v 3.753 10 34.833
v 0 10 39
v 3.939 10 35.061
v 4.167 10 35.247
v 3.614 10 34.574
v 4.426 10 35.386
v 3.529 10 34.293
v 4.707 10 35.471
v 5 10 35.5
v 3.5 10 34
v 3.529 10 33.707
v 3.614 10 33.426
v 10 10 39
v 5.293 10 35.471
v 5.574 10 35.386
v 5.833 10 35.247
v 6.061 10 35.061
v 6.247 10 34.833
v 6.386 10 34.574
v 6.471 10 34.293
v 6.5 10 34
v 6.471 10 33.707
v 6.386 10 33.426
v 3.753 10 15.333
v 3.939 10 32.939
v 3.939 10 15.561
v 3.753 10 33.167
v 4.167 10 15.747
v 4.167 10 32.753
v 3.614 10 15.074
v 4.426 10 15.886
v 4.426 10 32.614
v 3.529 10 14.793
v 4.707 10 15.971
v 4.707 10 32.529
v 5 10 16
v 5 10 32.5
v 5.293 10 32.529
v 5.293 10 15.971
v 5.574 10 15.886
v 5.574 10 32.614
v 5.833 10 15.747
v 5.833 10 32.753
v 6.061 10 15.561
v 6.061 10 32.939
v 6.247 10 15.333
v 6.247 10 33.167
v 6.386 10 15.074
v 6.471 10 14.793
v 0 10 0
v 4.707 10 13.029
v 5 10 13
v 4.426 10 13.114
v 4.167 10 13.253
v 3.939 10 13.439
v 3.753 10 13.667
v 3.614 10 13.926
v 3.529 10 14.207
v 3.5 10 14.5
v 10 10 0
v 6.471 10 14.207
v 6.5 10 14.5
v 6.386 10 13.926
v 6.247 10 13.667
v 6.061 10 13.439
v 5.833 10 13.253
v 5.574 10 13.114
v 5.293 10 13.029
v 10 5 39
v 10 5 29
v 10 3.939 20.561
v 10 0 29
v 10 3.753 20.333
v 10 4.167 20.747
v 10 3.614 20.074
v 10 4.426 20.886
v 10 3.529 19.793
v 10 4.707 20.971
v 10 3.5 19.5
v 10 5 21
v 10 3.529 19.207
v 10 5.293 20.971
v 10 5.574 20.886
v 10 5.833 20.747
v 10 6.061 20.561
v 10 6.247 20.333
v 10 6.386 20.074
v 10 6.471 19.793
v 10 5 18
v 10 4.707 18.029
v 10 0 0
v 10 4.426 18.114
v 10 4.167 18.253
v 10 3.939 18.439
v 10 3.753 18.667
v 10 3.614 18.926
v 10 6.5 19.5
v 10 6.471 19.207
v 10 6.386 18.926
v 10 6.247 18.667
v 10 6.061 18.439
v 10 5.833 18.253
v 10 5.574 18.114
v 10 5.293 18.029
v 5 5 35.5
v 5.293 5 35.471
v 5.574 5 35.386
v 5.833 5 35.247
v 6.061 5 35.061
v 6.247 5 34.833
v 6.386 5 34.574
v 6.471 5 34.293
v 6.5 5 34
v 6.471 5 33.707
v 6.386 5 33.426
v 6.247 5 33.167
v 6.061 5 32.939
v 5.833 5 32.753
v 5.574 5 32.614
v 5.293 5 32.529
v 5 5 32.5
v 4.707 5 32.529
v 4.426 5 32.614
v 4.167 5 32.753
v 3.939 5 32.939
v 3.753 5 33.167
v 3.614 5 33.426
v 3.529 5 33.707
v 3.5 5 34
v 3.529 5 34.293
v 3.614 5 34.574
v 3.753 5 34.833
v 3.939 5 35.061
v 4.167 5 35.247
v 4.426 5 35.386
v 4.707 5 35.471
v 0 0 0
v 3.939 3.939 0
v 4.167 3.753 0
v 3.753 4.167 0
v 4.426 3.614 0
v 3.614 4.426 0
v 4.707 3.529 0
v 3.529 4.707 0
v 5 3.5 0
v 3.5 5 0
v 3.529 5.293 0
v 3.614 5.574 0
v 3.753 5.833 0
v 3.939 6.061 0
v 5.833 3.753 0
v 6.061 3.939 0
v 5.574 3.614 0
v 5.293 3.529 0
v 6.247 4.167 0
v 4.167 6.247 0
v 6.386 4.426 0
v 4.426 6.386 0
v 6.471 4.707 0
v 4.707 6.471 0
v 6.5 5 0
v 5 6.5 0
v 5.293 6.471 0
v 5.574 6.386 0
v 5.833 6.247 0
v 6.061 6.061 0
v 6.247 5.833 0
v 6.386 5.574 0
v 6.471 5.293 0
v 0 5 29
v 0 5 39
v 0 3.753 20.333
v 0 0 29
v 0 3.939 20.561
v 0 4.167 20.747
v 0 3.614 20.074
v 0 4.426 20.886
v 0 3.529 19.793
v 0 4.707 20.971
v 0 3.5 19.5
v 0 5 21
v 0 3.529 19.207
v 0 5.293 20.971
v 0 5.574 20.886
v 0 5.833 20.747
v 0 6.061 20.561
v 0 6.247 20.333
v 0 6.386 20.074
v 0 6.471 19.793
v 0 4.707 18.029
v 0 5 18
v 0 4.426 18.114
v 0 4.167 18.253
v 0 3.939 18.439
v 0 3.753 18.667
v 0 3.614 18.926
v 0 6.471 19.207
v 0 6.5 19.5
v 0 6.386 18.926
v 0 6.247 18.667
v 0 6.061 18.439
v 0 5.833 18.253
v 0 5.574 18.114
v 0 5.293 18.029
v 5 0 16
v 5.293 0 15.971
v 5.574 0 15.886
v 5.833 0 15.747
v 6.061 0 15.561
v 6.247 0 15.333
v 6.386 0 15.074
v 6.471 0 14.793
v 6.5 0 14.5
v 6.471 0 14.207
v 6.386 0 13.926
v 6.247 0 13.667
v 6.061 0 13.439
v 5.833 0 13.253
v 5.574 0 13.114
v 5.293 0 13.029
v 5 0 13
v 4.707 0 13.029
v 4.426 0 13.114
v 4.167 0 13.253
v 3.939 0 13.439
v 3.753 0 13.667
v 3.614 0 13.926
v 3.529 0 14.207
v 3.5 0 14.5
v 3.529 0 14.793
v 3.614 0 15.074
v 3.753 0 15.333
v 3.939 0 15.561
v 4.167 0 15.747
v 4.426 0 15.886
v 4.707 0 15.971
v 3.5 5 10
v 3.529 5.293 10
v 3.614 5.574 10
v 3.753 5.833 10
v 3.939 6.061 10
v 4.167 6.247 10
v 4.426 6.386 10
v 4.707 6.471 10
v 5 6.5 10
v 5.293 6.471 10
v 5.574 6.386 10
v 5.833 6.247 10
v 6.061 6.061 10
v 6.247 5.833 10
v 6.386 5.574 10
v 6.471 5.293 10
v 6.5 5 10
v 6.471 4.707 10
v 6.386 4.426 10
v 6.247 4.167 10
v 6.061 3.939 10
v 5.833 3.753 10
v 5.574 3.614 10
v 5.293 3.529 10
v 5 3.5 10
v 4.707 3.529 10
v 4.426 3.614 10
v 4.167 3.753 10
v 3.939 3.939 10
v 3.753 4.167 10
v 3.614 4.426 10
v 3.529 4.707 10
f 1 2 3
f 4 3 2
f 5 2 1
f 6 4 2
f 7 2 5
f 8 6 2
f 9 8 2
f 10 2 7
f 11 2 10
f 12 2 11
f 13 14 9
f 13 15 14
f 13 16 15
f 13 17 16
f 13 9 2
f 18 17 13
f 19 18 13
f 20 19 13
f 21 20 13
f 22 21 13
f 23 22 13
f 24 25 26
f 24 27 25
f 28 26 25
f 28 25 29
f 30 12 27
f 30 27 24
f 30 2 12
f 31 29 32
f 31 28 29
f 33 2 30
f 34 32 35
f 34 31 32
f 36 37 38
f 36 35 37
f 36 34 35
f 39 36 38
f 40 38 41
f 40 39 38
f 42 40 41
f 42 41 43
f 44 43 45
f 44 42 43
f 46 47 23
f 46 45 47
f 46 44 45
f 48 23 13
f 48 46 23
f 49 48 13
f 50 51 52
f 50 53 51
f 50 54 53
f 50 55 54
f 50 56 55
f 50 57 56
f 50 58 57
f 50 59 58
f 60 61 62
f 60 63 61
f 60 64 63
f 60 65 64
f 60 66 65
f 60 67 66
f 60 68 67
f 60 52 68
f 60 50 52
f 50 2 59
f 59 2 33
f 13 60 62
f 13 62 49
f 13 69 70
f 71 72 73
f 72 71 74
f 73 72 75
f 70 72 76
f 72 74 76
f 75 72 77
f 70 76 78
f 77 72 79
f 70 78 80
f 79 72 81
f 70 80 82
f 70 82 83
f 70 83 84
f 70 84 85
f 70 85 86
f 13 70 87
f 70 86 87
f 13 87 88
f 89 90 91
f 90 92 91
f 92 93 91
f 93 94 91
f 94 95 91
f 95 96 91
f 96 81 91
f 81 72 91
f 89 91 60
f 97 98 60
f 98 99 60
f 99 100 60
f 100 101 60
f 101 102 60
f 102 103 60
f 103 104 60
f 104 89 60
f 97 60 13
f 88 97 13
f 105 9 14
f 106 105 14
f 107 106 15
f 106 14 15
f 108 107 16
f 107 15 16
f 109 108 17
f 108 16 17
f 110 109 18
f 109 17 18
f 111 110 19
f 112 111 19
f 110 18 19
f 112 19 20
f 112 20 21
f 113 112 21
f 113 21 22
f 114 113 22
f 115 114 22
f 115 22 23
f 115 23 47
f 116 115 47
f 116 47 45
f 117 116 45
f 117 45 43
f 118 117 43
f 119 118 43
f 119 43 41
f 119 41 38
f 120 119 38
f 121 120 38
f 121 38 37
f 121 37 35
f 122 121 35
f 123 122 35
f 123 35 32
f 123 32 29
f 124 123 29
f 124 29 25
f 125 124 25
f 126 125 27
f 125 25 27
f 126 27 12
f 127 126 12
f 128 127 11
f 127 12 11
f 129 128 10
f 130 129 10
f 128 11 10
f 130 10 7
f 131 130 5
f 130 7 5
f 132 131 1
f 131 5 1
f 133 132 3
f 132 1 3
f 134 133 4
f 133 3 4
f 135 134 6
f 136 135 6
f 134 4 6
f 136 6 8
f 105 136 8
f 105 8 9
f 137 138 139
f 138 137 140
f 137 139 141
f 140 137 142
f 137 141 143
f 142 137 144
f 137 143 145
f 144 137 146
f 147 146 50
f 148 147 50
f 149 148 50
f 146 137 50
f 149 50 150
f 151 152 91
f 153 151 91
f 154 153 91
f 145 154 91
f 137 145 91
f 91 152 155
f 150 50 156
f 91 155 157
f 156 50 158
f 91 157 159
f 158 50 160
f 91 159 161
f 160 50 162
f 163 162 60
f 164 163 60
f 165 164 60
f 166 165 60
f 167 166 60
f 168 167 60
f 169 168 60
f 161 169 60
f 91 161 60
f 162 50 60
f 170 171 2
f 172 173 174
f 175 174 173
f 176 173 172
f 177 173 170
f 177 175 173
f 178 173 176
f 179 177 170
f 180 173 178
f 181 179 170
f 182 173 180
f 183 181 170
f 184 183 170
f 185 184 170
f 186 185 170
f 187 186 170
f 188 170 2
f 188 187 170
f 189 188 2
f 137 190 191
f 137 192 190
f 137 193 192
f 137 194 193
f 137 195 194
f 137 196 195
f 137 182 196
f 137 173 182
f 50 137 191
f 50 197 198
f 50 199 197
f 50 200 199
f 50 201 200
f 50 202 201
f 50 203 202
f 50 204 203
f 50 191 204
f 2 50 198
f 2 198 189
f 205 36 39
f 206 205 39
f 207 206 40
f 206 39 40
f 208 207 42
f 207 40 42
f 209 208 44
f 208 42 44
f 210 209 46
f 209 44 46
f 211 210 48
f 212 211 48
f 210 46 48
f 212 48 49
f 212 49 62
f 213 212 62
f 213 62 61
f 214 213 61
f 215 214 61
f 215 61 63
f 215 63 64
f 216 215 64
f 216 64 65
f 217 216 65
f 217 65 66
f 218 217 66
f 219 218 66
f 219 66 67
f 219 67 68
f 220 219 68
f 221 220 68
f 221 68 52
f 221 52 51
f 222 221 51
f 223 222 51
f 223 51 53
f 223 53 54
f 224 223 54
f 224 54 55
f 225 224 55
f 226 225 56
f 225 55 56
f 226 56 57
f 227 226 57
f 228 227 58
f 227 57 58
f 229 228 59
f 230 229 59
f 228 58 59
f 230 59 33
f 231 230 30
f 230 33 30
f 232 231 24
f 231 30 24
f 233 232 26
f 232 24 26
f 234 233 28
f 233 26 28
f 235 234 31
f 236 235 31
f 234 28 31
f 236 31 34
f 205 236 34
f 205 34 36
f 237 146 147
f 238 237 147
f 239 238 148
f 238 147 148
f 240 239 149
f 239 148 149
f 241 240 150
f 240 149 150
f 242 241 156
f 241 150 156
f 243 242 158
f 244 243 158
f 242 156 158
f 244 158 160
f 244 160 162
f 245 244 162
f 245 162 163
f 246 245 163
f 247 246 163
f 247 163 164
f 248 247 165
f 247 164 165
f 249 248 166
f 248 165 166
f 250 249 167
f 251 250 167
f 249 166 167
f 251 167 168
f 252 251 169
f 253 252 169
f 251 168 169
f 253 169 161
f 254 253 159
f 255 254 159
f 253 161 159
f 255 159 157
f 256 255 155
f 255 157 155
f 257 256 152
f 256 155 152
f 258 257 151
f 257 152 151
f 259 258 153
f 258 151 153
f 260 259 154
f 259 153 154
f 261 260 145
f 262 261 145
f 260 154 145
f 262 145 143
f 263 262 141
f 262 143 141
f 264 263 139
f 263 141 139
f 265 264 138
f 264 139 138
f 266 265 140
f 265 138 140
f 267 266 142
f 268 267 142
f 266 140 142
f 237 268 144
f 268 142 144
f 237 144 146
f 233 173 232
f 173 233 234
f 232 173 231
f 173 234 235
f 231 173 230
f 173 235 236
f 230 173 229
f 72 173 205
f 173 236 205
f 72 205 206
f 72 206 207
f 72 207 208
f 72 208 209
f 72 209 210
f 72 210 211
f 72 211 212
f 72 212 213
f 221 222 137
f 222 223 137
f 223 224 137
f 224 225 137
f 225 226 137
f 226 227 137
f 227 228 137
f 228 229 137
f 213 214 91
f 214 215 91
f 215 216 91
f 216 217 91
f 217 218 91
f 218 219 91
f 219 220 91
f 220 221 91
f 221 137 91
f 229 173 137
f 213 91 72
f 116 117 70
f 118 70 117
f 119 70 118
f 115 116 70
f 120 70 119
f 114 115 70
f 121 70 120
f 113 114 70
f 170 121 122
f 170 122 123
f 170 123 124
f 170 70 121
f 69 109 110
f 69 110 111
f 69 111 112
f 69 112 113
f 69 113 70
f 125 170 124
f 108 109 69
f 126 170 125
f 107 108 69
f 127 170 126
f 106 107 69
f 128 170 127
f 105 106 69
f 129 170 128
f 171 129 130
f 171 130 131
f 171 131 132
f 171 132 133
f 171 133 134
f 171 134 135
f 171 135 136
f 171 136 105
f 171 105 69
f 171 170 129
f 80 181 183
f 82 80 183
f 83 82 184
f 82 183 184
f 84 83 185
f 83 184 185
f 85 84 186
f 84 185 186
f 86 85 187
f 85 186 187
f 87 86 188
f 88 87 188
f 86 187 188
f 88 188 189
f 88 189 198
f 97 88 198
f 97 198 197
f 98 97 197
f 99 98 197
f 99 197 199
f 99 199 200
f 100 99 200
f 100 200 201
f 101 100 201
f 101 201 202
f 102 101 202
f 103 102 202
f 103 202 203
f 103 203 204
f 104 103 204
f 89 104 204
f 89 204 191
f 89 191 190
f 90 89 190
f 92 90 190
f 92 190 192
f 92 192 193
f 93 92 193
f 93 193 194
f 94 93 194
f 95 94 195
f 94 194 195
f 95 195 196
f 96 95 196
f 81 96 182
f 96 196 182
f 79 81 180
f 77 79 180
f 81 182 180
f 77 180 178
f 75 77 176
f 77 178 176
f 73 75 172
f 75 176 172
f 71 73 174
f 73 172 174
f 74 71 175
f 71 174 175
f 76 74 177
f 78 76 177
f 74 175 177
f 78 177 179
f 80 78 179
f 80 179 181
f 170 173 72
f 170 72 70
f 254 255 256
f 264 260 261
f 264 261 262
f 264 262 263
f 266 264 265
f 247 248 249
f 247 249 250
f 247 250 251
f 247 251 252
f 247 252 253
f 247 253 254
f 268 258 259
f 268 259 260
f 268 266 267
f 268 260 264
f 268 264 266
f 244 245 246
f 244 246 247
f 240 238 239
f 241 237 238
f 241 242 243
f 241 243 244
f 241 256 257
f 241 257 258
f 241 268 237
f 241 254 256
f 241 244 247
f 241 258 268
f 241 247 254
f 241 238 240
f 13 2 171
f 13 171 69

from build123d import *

# Parameters (mm, degrees)
ESQUISSE1_W             = 10
ESQUISSE1_H             = 10
BOSS_EXTRU_1_DEPTH      = 39
ESQUISSE2_W             = 10
ESQUISSE2_H             = 5
ENL_V_MAT_EXTRU_1_DEPTH = 10
ESQUISSE3_R             = 1.5
ENL_V_MAT_EXTRU_2_DEPTH = 10
ESQUISSE4_R             = 1.5
ENL_V_MAT_EXTRU_3_DEPTH = 42.484937025
ESQUISSE5_R             = 1.5
ENL_V_MAT_EXTRU_4_DEPTH = 42.484937025
ESQUISSE6_R             = 1.5
ENL_V_MAT_EXTRU_5_DEPTH = 42.484937025


with BuildPart() as part:
    # Esquisse1 → Boss.-Extru.1 (new body)
    with BuildSketch(Plane.XY):
        with Locations((5, 5)):
            Rectangle(ESQUISSE1_W, ESQUISSE1_H)
    extrude(amount=BOSS_EXTRU_1_DEPTH)

    # Esquisse2 → Enlèv. mat.-Extru.1 (cut)
    with BuildSketch(Plane.ZY):
        with Locations((34, 2.5)):
            Rectangle(ESQUISSE2_W, ESQUISSE2_H)
    extrude(amount=-ENL_V_MAT_EXTRU_1_DEPTH, mode=Mode.SUBTRACT)

    # Esquisse3 → Enlèv. mat.-Extru.2 (cut)
    with BuildSketch(Plane(origin=(0, 0, 0), x_dir=(-1, 0, 0), z_dir=(0, 0, -1))):
        with Locations((-5, 5)):
            Circle(ESQUISSE3_R)
    extrude(amount=-ENL_V_MAT_EXTRU_2_DEPTH, mode=Mode.SUBTRACT)

    # Esquisse4 → Enlèv. mat.-Extru.3 (cut, through all)
    with BuildSketch(Plane(origin=(0, 10, 0), x_dir=(1, 0, 0), z_dir=(0, 1, 0))):
        with Locations(Location((5, -34, 0), (0, 0, 270))):
            Circle(ESQUISSE4_R)
    extrude(amount=-ENL_V_MAT_EXTRU_3_DEPTH, mode=Mode.SUBTRACT)

    # Esquisse5 → Enlèv. mat.-Extru.4 (cut, through all)
    with BuildSketch(Plane.ZY):
        with Locations((19.5, 5)):
            Circle(ESQUISSE5_R)
    extrude(amount=-ENL_V_MAT_EXTRU_4_DEPTH, mode=Mode.SUBTRACT)

    # Esquisse6 → Enlèv. mat.-Extru.5 (cut, through all)
    with BuildSketch(Plane(origin=(0, 10, 0), x_dir=(1, 0, 0), z_dir=(0, 1, 0))):
        with Locations(Location((5, -14.5, 0), (0, 0, 270))):
            Circle(ESQUISSE6_R)
    extrude(amount=-ENL_V_MAT_EXTRU_5_DEPTH, mode=Mode.SUBTRACT)


solid = part.part
